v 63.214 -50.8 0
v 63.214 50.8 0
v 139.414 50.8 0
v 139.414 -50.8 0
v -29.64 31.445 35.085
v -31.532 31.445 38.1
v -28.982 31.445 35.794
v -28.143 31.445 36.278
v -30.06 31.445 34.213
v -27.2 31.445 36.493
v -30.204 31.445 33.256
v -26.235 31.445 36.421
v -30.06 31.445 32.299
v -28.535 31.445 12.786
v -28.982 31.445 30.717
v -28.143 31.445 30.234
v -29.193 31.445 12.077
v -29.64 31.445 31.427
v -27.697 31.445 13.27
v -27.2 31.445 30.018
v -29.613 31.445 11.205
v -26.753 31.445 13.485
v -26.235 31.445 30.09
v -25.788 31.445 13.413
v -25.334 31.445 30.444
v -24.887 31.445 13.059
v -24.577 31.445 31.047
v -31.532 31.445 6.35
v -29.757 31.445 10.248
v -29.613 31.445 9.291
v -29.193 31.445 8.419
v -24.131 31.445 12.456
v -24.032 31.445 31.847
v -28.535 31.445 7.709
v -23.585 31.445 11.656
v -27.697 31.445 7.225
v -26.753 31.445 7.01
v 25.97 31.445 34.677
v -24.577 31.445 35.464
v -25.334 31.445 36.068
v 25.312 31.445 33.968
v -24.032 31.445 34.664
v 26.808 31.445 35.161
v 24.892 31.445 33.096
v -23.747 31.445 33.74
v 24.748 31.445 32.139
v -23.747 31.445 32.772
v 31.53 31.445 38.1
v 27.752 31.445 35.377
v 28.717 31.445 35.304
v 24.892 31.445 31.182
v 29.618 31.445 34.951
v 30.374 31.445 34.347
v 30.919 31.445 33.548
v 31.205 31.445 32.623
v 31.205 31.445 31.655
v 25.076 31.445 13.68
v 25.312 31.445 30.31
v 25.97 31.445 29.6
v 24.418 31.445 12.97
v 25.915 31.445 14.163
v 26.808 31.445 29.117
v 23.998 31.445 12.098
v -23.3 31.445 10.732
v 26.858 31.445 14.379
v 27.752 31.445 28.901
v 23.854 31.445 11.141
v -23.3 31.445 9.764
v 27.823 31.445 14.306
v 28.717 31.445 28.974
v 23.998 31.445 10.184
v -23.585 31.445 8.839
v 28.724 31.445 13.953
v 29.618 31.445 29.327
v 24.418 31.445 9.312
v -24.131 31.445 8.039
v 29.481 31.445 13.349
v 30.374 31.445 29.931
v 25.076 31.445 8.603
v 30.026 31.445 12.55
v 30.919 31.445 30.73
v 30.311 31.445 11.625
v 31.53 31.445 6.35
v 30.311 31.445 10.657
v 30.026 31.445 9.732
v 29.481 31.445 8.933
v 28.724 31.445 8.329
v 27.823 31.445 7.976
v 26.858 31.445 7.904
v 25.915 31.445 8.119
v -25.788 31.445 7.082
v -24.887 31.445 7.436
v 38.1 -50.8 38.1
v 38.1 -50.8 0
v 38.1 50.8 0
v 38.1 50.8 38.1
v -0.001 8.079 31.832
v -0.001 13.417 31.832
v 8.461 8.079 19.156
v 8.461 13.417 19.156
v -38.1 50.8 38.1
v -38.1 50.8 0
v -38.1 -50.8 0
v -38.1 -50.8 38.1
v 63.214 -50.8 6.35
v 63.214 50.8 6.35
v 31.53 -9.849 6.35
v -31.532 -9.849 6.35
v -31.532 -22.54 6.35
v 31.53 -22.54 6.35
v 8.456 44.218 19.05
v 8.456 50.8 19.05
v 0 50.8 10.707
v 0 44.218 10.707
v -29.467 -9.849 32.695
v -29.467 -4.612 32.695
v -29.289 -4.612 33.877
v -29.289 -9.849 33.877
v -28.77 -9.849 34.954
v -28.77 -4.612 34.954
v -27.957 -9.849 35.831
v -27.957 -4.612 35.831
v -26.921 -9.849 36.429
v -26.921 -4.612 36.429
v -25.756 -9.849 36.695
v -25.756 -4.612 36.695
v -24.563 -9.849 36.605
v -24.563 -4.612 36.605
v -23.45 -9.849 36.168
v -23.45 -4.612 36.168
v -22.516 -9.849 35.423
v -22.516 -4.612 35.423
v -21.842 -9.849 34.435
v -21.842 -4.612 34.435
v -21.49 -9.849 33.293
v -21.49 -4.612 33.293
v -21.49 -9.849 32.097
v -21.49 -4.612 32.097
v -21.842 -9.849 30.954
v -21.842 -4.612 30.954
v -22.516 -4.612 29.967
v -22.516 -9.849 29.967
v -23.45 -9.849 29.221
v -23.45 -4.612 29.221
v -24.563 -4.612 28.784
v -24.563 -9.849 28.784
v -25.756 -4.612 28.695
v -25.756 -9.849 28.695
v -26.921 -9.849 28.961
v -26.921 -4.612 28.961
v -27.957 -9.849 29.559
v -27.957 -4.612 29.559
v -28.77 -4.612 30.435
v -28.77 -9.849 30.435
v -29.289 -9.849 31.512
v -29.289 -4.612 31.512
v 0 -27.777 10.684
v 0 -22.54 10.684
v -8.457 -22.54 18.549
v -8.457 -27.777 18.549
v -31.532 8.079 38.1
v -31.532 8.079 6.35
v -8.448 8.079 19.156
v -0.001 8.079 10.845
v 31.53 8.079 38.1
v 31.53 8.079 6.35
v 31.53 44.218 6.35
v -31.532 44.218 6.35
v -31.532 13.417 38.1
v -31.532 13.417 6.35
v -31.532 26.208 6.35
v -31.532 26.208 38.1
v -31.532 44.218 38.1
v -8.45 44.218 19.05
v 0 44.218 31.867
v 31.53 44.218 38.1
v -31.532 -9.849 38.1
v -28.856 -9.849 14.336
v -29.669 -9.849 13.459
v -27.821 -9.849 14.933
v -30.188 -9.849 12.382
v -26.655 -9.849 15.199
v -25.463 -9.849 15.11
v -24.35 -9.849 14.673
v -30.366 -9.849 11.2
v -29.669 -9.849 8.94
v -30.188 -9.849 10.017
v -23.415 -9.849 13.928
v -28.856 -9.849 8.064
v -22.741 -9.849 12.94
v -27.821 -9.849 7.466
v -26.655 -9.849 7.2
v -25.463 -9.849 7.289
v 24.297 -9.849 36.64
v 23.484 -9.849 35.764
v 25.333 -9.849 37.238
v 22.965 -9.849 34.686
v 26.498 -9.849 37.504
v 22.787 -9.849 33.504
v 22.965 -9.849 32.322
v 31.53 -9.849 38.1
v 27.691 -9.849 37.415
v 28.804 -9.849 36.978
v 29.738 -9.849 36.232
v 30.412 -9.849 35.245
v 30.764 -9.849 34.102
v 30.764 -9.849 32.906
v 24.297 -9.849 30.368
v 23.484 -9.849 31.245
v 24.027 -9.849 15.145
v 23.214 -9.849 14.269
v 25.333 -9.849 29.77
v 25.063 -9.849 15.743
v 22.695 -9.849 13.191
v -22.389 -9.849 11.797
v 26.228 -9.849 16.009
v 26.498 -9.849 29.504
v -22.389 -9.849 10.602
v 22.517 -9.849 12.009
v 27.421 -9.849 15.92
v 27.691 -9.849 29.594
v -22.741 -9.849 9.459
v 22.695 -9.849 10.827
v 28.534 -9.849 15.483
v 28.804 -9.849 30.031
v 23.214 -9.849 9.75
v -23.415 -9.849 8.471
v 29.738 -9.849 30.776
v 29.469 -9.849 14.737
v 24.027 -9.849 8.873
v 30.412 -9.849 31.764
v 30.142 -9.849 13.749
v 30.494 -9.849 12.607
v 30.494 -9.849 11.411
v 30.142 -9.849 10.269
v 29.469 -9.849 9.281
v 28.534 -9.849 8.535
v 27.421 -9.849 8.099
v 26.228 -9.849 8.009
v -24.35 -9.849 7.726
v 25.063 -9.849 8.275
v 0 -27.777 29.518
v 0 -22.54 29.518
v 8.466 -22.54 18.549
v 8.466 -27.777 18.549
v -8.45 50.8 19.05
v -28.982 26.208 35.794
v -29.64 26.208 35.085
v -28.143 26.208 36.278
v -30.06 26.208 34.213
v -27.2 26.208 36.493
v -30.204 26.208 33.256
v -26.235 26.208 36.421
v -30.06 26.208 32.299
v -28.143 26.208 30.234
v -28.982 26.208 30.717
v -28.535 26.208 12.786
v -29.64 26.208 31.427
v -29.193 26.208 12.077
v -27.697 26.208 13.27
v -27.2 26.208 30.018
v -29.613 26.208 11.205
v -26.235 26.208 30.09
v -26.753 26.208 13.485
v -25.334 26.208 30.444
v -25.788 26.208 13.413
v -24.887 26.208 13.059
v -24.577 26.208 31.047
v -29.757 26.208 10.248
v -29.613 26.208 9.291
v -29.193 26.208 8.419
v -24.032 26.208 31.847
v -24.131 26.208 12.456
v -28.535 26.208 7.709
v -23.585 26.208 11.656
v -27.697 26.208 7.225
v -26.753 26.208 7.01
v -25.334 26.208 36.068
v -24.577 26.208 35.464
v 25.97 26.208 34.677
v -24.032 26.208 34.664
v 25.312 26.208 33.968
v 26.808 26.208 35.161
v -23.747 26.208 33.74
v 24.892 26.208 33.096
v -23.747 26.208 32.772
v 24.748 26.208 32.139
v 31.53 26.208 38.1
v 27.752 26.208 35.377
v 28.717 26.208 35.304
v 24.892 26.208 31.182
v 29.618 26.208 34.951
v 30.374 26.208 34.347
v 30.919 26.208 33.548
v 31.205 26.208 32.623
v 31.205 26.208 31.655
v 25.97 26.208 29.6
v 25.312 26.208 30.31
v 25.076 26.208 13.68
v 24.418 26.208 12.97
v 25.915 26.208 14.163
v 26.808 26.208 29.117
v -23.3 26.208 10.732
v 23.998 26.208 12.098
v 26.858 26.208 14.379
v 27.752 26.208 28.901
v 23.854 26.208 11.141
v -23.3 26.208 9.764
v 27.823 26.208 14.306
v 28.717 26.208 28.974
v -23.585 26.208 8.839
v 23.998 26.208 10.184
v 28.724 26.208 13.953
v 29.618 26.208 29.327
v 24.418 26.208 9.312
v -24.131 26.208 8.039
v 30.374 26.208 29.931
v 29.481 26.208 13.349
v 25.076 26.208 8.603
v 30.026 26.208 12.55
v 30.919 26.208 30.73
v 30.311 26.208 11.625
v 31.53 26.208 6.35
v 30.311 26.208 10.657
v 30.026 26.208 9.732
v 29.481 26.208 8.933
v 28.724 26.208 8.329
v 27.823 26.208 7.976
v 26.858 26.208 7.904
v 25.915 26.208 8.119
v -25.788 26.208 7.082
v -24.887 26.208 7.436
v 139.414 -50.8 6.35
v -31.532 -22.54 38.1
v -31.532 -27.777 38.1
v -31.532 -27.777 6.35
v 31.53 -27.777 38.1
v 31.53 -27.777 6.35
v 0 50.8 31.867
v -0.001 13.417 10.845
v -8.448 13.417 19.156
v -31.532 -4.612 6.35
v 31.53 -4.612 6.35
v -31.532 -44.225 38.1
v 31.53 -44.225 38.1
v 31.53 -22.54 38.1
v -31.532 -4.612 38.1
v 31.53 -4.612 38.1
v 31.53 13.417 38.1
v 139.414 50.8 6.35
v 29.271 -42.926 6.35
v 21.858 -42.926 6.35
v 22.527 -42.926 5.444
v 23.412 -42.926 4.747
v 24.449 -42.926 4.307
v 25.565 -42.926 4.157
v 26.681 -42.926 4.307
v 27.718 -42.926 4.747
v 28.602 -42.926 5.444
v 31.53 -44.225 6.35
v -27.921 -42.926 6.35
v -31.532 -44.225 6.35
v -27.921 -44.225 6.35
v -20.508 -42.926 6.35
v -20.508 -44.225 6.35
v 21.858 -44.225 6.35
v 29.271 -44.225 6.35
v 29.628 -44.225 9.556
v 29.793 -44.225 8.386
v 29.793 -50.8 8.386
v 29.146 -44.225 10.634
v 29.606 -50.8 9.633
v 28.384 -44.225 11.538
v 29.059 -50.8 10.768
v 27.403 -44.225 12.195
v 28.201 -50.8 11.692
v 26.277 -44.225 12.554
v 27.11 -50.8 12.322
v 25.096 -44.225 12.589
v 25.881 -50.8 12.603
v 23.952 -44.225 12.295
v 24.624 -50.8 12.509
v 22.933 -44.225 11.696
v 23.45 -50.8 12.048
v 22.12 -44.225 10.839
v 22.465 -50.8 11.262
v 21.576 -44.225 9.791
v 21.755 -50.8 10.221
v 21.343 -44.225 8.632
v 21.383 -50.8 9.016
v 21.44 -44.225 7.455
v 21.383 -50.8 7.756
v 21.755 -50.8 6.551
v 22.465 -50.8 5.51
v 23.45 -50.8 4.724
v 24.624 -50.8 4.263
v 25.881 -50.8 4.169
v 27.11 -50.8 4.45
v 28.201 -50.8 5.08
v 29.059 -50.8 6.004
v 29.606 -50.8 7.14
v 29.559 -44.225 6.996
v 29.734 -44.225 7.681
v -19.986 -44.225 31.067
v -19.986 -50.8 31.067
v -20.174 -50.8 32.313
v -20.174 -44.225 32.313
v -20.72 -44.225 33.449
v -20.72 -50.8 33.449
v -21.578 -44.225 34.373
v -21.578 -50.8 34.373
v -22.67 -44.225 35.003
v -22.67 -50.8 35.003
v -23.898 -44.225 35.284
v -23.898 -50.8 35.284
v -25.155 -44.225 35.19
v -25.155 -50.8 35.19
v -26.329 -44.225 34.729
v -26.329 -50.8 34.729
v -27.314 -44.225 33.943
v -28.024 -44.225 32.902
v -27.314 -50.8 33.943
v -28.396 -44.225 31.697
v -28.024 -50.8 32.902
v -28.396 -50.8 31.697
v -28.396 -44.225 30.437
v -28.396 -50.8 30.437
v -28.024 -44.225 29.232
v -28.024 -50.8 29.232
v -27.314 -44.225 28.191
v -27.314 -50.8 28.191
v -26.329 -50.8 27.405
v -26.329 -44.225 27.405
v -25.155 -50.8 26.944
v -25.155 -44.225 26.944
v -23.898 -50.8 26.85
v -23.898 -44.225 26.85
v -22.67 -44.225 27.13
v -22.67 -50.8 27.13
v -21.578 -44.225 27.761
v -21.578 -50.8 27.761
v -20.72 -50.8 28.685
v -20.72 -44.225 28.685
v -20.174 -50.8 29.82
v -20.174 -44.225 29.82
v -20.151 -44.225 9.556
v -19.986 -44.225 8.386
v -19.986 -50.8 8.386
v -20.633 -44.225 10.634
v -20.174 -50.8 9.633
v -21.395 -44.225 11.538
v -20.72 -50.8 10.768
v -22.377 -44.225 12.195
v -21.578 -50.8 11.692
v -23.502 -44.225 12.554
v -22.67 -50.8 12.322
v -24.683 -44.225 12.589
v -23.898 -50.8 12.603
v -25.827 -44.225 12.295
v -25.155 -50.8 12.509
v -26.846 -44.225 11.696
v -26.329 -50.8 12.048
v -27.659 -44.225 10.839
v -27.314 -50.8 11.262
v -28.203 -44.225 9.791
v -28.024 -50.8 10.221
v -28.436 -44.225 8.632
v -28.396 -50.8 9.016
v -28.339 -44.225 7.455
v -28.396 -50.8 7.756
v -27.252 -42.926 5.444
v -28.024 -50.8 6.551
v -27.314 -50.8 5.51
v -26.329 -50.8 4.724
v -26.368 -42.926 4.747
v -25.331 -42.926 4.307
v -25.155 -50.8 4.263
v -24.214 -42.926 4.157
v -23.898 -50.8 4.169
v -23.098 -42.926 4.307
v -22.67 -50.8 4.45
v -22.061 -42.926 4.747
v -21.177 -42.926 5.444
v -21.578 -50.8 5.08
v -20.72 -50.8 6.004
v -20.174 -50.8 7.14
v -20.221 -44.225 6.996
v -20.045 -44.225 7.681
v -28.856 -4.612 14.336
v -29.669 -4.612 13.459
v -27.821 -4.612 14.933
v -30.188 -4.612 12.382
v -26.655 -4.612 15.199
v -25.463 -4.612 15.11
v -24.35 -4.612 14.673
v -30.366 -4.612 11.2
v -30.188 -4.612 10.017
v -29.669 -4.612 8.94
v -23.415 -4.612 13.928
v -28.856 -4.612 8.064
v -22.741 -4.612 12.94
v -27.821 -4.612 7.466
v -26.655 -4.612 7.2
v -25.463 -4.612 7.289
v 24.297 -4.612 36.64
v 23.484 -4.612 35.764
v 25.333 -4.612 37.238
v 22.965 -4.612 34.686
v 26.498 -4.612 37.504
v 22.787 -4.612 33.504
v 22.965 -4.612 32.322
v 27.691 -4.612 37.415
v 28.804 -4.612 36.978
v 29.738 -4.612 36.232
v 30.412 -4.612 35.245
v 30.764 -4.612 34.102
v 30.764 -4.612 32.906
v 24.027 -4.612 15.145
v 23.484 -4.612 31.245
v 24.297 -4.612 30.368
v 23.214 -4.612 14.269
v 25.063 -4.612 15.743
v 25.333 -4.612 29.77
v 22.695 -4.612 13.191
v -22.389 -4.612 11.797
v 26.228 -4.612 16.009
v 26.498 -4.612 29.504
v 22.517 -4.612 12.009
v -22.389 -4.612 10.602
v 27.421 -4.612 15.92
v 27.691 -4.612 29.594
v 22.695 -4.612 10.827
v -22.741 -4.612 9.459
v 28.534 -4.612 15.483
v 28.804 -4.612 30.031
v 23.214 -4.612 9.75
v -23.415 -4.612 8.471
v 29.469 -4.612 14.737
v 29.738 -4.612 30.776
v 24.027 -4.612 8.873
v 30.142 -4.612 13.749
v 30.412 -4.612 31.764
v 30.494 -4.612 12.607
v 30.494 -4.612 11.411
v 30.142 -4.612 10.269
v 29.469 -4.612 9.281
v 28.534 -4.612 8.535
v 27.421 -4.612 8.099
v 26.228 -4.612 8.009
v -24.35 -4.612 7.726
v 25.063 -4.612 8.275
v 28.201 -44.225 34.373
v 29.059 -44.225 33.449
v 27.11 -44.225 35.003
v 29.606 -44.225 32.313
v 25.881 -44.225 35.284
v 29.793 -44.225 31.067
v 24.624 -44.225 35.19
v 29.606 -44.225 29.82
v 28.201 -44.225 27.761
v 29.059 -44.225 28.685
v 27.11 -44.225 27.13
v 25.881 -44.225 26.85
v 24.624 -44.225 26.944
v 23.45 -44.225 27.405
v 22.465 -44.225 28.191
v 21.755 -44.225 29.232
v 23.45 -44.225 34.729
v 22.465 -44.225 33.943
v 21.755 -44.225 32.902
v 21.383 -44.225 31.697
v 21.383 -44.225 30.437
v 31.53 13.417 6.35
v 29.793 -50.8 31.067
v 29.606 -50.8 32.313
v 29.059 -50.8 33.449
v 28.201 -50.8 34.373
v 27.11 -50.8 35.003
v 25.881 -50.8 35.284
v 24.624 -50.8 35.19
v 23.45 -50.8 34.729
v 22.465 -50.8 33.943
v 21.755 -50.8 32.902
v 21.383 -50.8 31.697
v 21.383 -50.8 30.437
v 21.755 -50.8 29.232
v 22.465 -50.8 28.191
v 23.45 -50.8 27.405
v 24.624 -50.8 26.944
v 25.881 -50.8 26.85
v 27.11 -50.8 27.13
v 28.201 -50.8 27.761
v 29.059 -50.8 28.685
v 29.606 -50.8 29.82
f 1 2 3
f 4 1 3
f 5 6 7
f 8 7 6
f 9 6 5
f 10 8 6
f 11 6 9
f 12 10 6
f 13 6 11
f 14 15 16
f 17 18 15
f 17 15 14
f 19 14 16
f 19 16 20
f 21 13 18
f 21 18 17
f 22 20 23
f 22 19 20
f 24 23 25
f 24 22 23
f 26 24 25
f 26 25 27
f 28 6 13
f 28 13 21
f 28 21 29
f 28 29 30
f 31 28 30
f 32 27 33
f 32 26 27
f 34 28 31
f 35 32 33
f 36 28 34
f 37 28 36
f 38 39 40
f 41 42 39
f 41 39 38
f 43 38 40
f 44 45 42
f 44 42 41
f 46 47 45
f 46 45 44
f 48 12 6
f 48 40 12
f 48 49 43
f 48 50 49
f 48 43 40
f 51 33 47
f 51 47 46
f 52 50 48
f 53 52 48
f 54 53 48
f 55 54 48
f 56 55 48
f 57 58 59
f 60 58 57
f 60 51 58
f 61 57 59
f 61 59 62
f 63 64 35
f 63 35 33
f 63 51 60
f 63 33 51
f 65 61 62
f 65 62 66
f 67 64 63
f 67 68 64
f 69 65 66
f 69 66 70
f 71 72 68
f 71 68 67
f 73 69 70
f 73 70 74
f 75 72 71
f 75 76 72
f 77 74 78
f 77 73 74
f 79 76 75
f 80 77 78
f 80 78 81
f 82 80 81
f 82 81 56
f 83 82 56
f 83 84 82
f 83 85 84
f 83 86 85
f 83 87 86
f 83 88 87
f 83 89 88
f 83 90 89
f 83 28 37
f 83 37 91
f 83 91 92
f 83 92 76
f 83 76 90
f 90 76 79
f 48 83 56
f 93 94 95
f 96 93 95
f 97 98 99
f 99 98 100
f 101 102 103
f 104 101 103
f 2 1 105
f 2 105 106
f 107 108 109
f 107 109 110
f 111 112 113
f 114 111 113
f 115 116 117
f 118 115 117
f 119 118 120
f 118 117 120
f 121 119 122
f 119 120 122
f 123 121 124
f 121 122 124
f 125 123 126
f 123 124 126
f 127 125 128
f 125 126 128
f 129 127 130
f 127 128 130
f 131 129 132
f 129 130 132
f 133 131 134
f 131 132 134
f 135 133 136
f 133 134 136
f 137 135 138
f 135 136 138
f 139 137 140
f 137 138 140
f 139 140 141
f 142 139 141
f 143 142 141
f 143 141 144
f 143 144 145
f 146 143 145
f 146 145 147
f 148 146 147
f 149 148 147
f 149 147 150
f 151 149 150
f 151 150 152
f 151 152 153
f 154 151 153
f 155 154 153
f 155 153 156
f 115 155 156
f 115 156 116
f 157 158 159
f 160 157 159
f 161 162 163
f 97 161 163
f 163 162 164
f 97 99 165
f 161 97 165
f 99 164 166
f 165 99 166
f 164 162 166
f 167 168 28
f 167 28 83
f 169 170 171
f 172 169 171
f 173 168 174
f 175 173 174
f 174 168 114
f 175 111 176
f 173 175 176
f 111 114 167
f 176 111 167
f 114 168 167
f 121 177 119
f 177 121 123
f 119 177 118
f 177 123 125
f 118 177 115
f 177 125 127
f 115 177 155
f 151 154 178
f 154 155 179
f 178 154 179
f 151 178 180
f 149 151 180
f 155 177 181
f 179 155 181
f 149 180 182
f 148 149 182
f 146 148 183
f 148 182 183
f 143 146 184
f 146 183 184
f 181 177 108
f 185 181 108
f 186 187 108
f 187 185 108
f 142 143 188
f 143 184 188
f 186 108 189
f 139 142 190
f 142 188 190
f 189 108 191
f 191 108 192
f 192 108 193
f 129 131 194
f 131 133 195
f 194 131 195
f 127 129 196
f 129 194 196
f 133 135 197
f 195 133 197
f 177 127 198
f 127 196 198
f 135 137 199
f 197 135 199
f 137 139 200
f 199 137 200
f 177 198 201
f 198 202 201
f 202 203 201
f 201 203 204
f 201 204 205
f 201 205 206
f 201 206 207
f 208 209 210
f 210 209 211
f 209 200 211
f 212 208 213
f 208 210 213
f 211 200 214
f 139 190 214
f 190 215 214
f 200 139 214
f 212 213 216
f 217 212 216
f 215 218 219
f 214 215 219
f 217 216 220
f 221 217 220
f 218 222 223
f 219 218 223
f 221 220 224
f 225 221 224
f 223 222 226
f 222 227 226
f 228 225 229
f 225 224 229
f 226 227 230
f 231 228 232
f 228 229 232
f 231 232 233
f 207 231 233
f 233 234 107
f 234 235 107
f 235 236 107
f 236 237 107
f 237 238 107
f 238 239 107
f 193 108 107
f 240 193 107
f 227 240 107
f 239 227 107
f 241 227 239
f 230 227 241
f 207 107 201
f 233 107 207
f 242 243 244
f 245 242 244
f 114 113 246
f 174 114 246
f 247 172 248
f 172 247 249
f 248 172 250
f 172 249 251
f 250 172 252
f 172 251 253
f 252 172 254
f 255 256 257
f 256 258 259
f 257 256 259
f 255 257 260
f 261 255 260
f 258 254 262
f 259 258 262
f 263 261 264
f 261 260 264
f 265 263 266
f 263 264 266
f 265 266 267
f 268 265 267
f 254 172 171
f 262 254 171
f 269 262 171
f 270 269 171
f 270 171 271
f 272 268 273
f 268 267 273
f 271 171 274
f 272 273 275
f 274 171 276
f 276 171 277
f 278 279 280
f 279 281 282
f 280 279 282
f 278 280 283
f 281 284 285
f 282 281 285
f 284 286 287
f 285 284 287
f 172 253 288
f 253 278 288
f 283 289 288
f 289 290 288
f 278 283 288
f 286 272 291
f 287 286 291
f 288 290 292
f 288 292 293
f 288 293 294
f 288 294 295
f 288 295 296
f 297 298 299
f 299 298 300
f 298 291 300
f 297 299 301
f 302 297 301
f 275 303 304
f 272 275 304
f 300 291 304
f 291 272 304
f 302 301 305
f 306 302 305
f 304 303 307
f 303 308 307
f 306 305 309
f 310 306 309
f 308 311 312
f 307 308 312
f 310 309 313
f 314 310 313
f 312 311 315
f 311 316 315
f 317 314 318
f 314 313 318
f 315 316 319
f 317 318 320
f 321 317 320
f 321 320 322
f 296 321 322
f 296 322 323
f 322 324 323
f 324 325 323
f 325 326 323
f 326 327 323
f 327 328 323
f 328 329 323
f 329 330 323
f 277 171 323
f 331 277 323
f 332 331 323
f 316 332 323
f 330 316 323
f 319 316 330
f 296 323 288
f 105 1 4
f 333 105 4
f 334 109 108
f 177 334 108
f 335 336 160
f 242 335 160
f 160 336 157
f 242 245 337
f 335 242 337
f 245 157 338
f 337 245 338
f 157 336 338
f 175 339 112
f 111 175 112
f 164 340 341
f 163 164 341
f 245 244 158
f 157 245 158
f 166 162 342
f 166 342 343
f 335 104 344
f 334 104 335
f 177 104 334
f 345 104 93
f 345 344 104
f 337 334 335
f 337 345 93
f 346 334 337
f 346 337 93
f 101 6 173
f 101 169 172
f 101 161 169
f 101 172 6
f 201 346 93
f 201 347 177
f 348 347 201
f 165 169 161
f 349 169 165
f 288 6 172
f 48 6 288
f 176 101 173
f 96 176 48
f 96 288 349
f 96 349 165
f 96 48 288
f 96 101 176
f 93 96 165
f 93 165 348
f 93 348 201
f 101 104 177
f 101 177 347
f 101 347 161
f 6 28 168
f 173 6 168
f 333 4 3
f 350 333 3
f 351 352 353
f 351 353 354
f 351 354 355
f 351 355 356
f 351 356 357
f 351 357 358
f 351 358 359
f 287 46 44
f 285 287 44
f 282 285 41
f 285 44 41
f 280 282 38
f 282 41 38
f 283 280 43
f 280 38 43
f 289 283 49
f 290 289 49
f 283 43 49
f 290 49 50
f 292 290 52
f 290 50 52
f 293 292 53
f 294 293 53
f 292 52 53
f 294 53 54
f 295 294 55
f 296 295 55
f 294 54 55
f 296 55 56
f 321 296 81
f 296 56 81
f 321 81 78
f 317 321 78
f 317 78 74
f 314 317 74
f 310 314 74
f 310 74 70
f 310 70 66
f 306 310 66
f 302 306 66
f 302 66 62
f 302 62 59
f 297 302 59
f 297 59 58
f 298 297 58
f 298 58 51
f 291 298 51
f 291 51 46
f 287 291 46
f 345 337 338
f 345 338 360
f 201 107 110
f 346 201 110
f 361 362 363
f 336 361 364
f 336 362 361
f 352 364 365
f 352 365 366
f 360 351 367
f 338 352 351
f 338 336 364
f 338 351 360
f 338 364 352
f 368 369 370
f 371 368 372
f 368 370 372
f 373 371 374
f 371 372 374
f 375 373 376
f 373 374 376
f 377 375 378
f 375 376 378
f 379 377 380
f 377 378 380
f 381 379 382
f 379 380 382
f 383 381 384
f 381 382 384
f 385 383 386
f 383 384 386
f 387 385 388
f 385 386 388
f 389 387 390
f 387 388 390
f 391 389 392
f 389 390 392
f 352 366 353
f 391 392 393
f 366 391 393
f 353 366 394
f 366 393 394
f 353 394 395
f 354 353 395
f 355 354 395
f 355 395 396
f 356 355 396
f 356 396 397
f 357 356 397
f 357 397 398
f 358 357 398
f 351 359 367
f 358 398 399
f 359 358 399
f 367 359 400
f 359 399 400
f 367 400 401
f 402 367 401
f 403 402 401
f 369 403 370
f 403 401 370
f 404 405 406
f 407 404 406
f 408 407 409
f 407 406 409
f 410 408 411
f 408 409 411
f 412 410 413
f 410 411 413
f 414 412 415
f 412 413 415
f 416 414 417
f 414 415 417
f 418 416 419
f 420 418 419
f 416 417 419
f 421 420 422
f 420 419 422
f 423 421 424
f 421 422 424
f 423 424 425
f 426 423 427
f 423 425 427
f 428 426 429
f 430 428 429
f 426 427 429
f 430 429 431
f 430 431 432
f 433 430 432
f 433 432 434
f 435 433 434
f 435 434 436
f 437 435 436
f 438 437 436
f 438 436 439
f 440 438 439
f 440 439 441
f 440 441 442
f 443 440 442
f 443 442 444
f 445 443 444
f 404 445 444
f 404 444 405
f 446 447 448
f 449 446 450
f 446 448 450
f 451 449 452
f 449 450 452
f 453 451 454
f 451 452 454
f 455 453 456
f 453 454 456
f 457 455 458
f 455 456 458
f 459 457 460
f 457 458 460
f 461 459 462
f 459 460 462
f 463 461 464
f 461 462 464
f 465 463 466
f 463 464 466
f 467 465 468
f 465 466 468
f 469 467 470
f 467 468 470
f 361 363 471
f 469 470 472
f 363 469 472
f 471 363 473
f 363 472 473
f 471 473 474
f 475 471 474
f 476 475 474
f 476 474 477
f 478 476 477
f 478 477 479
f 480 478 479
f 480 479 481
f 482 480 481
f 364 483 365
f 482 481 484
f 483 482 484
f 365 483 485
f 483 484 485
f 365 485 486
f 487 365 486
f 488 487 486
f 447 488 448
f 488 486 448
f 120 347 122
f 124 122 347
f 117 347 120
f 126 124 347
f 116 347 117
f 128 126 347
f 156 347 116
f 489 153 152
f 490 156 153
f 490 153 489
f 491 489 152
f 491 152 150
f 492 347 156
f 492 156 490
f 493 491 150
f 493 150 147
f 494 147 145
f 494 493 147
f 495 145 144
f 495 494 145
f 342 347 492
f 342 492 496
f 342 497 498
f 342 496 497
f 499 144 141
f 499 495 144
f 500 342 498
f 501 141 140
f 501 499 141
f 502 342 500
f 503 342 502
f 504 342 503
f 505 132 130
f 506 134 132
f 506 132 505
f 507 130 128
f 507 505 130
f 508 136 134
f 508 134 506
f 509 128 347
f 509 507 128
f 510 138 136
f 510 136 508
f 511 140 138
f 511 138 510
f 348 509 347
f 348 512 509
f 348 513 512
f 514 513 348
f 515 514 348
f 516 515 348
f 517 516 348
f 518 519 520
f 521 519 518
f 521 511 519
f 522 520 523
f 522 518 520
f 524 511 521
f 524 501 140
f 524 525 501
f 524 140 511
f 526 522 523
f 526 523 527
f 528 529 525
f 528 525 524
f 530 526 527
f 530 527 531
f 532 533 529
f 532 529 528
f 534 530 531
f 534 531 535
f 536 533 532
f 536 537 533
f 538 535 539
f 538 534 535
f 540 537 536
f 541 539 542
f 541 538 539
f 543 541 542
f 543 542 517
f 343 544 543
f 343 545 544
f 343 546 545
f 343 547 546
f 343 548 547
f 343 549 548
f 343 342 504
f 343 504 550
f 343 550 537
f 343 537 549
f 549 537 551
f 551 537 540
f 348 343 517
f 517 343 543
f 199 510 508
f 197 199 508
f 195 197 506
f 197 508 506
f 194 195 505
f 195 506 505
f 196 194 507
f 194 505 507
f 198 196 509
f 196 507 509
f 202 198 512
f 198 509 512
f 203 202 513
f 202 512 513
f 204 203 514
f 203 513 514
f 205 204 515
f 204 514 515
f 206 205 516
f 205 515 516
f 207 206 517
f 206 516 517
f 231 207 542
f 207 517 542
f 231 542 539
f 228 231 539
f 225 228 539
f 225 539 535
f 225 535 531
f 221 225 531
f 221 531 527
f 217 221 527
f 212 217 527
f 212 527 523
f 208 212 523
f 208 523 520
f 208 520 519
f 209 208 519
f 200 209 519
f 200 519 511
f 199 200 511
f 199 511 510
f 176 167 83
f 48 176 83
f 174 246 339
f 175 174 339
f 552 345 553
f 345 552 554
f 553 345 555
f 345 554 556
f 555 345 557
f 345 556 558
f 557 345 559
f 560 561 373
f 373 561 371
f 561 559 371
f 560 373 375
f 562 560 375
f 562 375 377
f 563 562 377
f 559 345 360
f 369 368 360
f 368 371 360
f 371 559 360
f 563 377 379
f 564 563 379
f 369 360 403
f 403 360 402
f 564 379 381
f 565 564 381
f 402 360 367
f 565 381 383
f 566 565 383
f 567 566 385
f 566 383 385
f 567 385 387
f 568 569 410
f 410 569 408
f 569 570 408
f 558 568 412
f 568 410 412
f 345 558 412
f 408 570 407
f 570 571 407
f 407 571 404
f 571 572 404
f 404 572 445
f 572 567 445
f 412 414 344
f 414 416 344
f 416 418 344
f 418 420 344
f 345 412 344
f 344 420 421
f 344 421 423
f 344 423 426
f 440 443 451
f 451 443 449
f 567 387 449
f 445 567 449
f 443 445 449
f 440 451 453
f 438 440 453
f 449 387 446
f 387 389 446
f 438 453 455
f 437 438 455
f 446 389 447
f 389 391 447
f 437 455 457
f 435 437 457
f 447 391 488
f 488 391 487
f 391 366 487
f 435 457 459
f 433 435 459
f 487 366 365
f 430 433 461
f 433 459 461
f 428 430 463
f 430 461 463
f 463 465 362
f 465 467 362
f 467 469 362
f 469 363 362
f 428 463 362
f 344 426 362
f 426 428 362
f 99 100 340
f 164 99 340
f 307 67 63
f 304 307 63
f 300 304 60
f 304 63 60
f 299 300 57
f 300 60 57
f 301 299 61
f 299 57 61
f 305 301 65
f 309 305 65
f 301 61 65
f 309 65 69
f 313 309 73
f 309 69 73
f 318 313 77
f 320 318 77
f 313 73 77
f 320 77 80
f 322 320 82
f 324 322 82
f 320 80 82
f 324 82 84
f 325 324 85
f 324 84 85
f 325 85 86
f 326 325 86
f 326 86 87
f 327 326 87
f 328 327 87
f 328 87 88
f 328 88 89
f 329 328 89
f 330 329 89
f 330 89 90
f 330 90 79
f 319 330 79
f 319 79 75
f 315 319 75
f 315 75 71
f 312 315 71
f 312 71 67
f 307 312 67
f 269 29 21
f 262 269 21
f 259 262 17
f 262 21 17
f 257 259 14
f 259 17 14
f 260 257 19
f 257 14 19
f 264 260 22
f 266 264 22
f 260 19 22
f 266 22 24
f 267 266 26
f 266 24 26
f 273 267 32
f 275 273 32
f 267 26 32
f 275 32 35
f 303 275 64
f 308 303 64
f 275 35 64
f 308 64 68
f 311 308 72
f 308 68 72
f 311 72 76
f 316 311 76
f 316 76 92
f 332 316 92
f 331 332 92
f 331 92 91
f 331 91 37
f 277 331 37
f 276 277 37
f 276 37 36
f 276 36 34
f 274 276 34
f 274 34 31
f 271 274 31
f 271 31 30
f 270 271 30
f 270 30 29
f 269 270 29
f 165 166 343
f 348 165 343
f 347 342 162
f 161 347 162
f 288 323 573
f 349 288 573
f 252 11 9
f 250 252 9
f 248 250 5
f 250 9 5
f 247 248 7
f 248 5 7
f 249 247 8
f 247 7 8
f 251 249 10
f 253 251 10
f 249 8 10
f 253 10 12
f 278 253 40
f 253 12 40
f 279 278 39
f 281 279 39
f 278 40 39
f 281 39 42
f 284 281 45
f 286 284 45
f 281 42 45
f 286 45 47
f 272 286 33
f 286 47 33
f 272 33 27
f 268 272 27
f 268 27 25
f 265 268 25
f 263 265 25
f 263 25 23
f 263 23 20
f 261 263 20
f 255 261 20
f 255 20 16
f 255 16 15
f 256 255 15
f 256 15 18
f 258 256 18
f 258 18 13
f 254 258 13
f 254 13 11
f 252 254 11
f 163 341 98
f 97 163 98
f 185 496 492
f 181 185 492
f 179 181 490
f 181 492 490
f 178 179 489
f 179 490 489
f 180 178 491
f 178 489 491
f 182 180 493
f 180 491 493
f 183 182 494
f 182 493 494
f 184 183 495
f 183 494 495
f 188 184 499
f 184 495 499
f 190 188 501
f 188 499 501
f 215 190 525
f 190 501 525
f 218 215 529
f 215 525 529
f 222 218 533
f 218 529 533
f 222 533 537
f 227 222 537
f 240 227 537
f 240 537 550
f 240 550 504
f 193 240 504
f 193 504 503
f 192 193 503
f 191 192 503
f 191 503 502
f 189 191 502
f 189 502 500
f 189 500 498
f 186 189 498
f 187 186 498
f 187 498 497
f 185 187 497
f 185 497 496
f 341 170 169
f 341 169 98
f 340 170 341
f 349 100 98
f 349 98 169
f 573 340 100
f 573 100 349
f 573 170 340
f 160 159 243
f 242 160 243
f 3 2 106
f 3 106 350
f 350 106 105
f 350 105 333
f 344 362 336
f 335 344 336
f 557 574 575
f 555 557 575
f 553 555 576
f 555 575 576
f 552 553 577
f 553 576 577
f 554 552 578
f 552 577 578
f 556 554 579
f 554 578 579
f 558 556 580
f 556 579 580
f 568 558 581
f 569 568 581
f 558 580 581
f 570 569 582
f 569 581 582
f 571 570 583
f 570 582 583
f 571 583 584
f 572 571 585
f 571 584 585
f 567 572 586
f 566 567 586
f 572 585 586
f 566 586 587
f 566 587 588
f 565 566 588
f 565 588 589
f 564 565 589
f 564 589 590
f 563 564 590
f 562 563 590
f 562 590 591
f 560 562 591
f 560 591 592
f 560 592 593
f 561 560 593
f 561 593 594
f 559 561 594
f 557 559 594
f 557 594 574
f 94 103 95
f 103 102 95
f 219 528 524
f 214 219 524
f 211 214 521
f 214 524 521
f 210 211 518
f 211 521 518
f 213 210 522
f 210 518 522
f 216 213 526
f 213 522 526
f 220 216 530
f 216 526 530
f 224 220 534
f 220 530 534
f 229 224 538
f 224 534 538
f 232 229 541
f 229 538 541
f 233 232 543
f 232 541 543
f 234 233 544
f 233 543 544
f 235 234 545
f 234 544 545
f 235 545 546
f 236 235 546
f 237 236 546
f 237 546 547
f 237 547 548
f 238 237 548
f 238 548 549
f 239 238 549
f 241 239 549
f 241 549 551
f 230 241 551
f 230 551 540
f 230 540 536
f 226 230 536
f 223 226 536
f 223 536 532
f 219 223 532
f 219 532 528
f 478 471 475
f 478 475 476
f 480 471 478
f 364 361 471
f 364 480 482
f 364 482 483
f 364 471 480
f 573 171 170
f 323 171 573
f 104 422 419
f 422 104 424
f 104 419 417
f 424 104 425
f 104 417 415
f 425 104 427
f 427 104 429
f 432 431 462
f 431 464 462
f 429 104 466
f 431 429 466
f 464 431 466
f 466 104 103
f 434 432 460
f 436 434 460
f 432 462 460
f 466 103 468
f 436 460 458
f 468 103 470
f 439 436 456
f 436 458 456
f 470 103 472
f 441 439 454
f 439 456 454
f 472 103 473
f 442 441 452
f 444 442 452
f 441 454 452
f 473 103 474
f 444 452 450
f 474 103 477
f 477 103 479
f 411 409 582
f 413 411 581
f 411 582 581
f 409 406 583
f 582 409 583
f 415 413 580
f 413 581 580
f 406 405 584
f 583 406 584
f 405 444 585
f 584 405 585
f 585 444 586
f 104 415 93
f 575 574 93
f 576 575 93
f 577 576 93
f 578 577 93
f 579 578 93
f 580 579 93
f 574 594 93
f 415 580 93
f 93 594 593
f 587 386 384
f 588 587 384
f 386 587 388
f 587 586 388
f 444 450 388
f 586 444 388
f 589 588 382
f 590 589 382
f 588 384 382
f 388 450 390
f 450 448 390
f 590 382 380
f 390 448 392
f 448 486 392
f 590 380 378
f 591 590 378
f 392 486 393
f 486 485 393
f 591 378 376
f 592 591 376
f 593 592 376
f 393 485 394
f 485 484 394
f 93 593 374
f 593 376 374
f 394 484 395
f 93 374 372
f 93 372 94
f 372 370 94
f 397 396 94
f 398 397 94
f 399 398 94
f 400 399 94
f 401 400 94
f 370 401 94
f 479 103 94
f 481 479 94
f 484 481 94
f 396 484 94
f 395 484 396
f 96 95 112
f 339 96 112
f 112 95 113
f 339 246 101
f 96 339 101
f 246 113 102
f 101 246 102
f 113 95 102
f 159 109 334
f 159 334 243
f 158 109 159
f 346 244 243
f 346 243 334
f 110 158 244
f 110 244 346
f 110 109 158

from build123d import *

# Parameters (mm, degrees)
F0_W      = 6.5682004154
F0_H      = 6.5745791972
F0_W_2    = 6.5704989195
F0_H_2    = 6.5824283838
F0_W_3    = 63.0613006651
F0_H_3    = 5.2373763174
F0_H_4    = 5.3380923346
F0_H_5    = 5.2373749204
F0_H_6    = 5.2373744547
F1_DEPTH  = 38.1
F0_H_7    = 12.7722844481
F0_H_8    = 12.791281566
F0_H_9    = 12.6905632205
F0_H_10   = 12.6905627549
F0_H_11   = 16.4480824023
F2_DEPTH  = 6.35
F4_DEPTH  = 12.7
F5_R      = 3.2467068395
F6_DEPTH  = 7.62
F8_DEPTH  = 7.62
F9_R      = 4.0110707537
F10_DEPTH = 7.62
F12_DEPTH = 7.62
F13_R     = 4.2287470851
F14_DEPTH = 7.874
F0_W_4    = 76.2
F0_H_12   = 101.6
F15_DEPTH = 6.35


with BuildPart() as f1:
    # F0 (on Top) → F1 (new body)
    with BuildSketch(Plane.XY):
        with Locations((-34.8158997923, -47.5127104014)):
            Rectangle(F0_W, F0_H)
        with Locations((34.8147505403, 47.5087858081)):
            Rectangle(F0_W_2, F0_H_2)
        with Locations((34.8147505403, -47.5127104014)):
            Rectangle(F0_W_2, F0_H)
        with Locations((-34.8158997923, 47.5087858081)):
            Rectangle(F0_W, F0_H_2)
        with Locations((-0.0011492521, -47.5127104014)):
            Rectangle(F0_W_3, F0_H)
        with Locations((-0.0011492521, 47.5087858081)):
            Rectangle(F0_W_3, F0_H_2)
        Polygon((31.5295010805, -44.2254208028), (38.1, -44.2254208028), (38.1, 44.2175716162), (31.5295010805, 44.2175716162), (31.5295010805, 31.445287168), (31.5295010805, 26.2079108506), (31.5295010805, 13.4166292846), (31.5295010805, 8.0785369501), (31.5295010805, -4.6120262705), (31.5295010805, -9.8494011909), (31.5295010805, -22.5399639457), (31.5295010805, -27.7773384005), align=None)
        Polygon((-38.1, -44.2254208028), (-31.5317995846, -44.2254208028), (-31.5317995846, -27.7773384005), (-31.5317995846, -22.5399639457), (-31.5317995846, -9.8494011909), (-31.5317995846, -4.6120262705), (-31.5317995846, 8.0785369501), (-31.5317995846, 13.4166292846), (-31.5317995846, 26.2079108506), (-31.5317995846, 31.445287168), (-31.5317995846, 44.2175716162), (-38.1, 44.2175716162), align=None)
        with Locations((-0.0011492521, 28.8265990093)):
            Rectangle(F0_W_3, F0_H_3)
        with Locations((-0.0011492521, 10.7475831173)):
            Rectangle(F0_W_3, F0_H_4)
        with Locations((-0.0011492521, -7.2307137307)):
            Rectangle(F0_W_3, F0_H_5)
        with Locations((-0.0011492521, -25.1586511731)):
            Rectangle(F0_W_3, F0_H_6)
    extrude(amount=F1_DEPTH)

    # F0 (on Top) → F2 (join)
    with BuildSketch(Plane.XY):
        with Locations((-0.0011492521, 37.8314293921)):
            Rectangle(F0_W_3, F0_H_7)
        with Locations((-0.0011492521, 19.8122700676)):
            Rectangle(F0_W_3, F0_H_8)
        with Locations((-0.0011492521, 1.7332553398)):
            Rectangle(F0_W_3, F0_H_9)
        with Locations((-0.0011492521, -16.1946825683)):
            Rectangle(F0_W_3, F0_H_10)
        with Locations((-0.0011492521, -36.0013796017)):
            Rectangle(F0_W_3, F0_H_11)
    extrude(amount=F2_DEPTH)

    # F3 (on face) → F4 (cut)
    with BuildSketch(Plane(origin=(0, 50.8, 0), x_dir=(-1, 0, 0), z_dir=(0, 1, 0))):
        Polygon((8.4496559575, 19.05), (0, 31.867492944), (0, 19.05), align=None)
        Polygon((0, 19.05), (0, 31.867492944), (-8.4557794034, 19.05), align=None)
        Polygon((8.4496559575, 19.05), (0, 19.05), (0, 10.7070542872), align=None)
        Polygon((0, 10.7070542872), (0, 19.05), (-8.4557794034, 19.05), align=None)
    extrude(amount=-F4_DEPTH, mode=Mode.SUBTRACT)

    # F5 (on face) → F6 (cut)
    with BuildSketch(Plane(origin=(0, 31.445287168, 0), x_dir=(-1, 0, 0), z_dir=(0, 1, 0))):
        with Locations((-27.1007362753, 11.141131632)):
            Circle(F5_R)
        with Locations((-27.9942583293, 32.138876617)):
            Circle(F5_R)
        with Locations((26.9572865218, 33.2557782531)):
            Circle(F5_R)
        with Locations((26.5105273575, 10.2476105094)):
            Circle(F5_R)
    extrude(amount=-F6_DEPTH, mode=Mode.SUBTRACT)

    # F7 (on face) → F8 (cut)
    with BuildSketch(Plane(origin=(0, 13.4166292846, 0), x_dir=(-1, 0, 0), z_dir=(0, 1, 0))):
        Polygon((-8.4612863138, 19.1561579704), (0.0011492521, 19.1561579704), (0.0011492521, 31.8320021033), align=None)
        Polygon((-8.4612863138, 19.1561579704), (0.0011492521, 10.8450967818), (0.0011492521, 19.1561579704), align=None)
        Polygon((0.0011492521, 31.8320021033), (0.0011492521, 19.1561579704), (8.4477588534, 19.1561579704), align=None)
        Polygon((0.0011492521, 19.1561579704), (0.0011492521, 10.8450967818), (8.4477588534, 19.1561579704), align=None)
    extrude(amount=-F8_DEPTH, mode=Mode.SUBTRACT)

    # F9 (on face) → F10 (cut)
    with BuildSketch(Plane(origin=(0, -4.6120262705, 0), x_dir=(-1, 0, 0), z_dir=(0, 1, 0))):
        with Locations((-26.5282280743, 12.0090292767)):
            Circle(F9_R)
        with Locations((-26.7980415374, 33.5041955113)):
            Circle(F9_R)
        with Locations((26.3552796096, 11.1995879561)):
            Circle(F9_R)
        with Locations((25.4559013993, 32.6947569847)):
            Circle(F9_R)
    extrude(amount=-F10_DEPTH, mode=Mode.SUBTRACT)

    # F11 (on face) → F12 (cut)
    with BuildSketch(Plane(origin=(0, -22.5399639457, 0), x_dir=(-1, 0, 0), z_dir=(0, 1, 0))):
        Polygon((-8.465975523, 18.5493603349), (0, 10.6839193031), (0, 18.5493603349), align=None)
        Polygon((0, 18.5493603349), (0, 10.6839193031), (8.4565812722, 18.5493603349), align=None)
        Polygon((0, 29.5175481588), (0, 18.5493603349), (8.4565812722, 18.5493603349), align=None)
        Polygon((-8.465975523, 18.5493603349), (0, 18.5493603349), (0, 29.5175481588), align=None)
    extrude(amount=-F12_DEPTH, mode=Mode.SUBTRACT)

    # F13 (on face) → F14 (cut)
    with BuildSketch(Plane.XZ.offset(50.8)):
        with Locations((-24.2144539952, 8.3860587329)):
            Circle(F13_R)
        with Locations((-24.2144539952, 31.0668349266)):
            Circle(F13_R)
        with Locations((25.5647450686, 31.0668349266)):
            Circle(F13_R)
        with Locations((25.5647450686, 8.3860587329)):
            Circle(F13_R)
    extrude(amount=-F14_DEPTH, mode=Mode.SUBTRACT)


with BuildPart() as f15:
    # F0 (on Top) → F15 (new body)
    with BuildSketch(Plane.XY):
        with Locations((101.3137432694, 0)):
            Rectangle(F0_W_4, F0_H_12)
    extrude(amount=F15_DEPTH)


solid = Compound([f1.part, f15.part])
